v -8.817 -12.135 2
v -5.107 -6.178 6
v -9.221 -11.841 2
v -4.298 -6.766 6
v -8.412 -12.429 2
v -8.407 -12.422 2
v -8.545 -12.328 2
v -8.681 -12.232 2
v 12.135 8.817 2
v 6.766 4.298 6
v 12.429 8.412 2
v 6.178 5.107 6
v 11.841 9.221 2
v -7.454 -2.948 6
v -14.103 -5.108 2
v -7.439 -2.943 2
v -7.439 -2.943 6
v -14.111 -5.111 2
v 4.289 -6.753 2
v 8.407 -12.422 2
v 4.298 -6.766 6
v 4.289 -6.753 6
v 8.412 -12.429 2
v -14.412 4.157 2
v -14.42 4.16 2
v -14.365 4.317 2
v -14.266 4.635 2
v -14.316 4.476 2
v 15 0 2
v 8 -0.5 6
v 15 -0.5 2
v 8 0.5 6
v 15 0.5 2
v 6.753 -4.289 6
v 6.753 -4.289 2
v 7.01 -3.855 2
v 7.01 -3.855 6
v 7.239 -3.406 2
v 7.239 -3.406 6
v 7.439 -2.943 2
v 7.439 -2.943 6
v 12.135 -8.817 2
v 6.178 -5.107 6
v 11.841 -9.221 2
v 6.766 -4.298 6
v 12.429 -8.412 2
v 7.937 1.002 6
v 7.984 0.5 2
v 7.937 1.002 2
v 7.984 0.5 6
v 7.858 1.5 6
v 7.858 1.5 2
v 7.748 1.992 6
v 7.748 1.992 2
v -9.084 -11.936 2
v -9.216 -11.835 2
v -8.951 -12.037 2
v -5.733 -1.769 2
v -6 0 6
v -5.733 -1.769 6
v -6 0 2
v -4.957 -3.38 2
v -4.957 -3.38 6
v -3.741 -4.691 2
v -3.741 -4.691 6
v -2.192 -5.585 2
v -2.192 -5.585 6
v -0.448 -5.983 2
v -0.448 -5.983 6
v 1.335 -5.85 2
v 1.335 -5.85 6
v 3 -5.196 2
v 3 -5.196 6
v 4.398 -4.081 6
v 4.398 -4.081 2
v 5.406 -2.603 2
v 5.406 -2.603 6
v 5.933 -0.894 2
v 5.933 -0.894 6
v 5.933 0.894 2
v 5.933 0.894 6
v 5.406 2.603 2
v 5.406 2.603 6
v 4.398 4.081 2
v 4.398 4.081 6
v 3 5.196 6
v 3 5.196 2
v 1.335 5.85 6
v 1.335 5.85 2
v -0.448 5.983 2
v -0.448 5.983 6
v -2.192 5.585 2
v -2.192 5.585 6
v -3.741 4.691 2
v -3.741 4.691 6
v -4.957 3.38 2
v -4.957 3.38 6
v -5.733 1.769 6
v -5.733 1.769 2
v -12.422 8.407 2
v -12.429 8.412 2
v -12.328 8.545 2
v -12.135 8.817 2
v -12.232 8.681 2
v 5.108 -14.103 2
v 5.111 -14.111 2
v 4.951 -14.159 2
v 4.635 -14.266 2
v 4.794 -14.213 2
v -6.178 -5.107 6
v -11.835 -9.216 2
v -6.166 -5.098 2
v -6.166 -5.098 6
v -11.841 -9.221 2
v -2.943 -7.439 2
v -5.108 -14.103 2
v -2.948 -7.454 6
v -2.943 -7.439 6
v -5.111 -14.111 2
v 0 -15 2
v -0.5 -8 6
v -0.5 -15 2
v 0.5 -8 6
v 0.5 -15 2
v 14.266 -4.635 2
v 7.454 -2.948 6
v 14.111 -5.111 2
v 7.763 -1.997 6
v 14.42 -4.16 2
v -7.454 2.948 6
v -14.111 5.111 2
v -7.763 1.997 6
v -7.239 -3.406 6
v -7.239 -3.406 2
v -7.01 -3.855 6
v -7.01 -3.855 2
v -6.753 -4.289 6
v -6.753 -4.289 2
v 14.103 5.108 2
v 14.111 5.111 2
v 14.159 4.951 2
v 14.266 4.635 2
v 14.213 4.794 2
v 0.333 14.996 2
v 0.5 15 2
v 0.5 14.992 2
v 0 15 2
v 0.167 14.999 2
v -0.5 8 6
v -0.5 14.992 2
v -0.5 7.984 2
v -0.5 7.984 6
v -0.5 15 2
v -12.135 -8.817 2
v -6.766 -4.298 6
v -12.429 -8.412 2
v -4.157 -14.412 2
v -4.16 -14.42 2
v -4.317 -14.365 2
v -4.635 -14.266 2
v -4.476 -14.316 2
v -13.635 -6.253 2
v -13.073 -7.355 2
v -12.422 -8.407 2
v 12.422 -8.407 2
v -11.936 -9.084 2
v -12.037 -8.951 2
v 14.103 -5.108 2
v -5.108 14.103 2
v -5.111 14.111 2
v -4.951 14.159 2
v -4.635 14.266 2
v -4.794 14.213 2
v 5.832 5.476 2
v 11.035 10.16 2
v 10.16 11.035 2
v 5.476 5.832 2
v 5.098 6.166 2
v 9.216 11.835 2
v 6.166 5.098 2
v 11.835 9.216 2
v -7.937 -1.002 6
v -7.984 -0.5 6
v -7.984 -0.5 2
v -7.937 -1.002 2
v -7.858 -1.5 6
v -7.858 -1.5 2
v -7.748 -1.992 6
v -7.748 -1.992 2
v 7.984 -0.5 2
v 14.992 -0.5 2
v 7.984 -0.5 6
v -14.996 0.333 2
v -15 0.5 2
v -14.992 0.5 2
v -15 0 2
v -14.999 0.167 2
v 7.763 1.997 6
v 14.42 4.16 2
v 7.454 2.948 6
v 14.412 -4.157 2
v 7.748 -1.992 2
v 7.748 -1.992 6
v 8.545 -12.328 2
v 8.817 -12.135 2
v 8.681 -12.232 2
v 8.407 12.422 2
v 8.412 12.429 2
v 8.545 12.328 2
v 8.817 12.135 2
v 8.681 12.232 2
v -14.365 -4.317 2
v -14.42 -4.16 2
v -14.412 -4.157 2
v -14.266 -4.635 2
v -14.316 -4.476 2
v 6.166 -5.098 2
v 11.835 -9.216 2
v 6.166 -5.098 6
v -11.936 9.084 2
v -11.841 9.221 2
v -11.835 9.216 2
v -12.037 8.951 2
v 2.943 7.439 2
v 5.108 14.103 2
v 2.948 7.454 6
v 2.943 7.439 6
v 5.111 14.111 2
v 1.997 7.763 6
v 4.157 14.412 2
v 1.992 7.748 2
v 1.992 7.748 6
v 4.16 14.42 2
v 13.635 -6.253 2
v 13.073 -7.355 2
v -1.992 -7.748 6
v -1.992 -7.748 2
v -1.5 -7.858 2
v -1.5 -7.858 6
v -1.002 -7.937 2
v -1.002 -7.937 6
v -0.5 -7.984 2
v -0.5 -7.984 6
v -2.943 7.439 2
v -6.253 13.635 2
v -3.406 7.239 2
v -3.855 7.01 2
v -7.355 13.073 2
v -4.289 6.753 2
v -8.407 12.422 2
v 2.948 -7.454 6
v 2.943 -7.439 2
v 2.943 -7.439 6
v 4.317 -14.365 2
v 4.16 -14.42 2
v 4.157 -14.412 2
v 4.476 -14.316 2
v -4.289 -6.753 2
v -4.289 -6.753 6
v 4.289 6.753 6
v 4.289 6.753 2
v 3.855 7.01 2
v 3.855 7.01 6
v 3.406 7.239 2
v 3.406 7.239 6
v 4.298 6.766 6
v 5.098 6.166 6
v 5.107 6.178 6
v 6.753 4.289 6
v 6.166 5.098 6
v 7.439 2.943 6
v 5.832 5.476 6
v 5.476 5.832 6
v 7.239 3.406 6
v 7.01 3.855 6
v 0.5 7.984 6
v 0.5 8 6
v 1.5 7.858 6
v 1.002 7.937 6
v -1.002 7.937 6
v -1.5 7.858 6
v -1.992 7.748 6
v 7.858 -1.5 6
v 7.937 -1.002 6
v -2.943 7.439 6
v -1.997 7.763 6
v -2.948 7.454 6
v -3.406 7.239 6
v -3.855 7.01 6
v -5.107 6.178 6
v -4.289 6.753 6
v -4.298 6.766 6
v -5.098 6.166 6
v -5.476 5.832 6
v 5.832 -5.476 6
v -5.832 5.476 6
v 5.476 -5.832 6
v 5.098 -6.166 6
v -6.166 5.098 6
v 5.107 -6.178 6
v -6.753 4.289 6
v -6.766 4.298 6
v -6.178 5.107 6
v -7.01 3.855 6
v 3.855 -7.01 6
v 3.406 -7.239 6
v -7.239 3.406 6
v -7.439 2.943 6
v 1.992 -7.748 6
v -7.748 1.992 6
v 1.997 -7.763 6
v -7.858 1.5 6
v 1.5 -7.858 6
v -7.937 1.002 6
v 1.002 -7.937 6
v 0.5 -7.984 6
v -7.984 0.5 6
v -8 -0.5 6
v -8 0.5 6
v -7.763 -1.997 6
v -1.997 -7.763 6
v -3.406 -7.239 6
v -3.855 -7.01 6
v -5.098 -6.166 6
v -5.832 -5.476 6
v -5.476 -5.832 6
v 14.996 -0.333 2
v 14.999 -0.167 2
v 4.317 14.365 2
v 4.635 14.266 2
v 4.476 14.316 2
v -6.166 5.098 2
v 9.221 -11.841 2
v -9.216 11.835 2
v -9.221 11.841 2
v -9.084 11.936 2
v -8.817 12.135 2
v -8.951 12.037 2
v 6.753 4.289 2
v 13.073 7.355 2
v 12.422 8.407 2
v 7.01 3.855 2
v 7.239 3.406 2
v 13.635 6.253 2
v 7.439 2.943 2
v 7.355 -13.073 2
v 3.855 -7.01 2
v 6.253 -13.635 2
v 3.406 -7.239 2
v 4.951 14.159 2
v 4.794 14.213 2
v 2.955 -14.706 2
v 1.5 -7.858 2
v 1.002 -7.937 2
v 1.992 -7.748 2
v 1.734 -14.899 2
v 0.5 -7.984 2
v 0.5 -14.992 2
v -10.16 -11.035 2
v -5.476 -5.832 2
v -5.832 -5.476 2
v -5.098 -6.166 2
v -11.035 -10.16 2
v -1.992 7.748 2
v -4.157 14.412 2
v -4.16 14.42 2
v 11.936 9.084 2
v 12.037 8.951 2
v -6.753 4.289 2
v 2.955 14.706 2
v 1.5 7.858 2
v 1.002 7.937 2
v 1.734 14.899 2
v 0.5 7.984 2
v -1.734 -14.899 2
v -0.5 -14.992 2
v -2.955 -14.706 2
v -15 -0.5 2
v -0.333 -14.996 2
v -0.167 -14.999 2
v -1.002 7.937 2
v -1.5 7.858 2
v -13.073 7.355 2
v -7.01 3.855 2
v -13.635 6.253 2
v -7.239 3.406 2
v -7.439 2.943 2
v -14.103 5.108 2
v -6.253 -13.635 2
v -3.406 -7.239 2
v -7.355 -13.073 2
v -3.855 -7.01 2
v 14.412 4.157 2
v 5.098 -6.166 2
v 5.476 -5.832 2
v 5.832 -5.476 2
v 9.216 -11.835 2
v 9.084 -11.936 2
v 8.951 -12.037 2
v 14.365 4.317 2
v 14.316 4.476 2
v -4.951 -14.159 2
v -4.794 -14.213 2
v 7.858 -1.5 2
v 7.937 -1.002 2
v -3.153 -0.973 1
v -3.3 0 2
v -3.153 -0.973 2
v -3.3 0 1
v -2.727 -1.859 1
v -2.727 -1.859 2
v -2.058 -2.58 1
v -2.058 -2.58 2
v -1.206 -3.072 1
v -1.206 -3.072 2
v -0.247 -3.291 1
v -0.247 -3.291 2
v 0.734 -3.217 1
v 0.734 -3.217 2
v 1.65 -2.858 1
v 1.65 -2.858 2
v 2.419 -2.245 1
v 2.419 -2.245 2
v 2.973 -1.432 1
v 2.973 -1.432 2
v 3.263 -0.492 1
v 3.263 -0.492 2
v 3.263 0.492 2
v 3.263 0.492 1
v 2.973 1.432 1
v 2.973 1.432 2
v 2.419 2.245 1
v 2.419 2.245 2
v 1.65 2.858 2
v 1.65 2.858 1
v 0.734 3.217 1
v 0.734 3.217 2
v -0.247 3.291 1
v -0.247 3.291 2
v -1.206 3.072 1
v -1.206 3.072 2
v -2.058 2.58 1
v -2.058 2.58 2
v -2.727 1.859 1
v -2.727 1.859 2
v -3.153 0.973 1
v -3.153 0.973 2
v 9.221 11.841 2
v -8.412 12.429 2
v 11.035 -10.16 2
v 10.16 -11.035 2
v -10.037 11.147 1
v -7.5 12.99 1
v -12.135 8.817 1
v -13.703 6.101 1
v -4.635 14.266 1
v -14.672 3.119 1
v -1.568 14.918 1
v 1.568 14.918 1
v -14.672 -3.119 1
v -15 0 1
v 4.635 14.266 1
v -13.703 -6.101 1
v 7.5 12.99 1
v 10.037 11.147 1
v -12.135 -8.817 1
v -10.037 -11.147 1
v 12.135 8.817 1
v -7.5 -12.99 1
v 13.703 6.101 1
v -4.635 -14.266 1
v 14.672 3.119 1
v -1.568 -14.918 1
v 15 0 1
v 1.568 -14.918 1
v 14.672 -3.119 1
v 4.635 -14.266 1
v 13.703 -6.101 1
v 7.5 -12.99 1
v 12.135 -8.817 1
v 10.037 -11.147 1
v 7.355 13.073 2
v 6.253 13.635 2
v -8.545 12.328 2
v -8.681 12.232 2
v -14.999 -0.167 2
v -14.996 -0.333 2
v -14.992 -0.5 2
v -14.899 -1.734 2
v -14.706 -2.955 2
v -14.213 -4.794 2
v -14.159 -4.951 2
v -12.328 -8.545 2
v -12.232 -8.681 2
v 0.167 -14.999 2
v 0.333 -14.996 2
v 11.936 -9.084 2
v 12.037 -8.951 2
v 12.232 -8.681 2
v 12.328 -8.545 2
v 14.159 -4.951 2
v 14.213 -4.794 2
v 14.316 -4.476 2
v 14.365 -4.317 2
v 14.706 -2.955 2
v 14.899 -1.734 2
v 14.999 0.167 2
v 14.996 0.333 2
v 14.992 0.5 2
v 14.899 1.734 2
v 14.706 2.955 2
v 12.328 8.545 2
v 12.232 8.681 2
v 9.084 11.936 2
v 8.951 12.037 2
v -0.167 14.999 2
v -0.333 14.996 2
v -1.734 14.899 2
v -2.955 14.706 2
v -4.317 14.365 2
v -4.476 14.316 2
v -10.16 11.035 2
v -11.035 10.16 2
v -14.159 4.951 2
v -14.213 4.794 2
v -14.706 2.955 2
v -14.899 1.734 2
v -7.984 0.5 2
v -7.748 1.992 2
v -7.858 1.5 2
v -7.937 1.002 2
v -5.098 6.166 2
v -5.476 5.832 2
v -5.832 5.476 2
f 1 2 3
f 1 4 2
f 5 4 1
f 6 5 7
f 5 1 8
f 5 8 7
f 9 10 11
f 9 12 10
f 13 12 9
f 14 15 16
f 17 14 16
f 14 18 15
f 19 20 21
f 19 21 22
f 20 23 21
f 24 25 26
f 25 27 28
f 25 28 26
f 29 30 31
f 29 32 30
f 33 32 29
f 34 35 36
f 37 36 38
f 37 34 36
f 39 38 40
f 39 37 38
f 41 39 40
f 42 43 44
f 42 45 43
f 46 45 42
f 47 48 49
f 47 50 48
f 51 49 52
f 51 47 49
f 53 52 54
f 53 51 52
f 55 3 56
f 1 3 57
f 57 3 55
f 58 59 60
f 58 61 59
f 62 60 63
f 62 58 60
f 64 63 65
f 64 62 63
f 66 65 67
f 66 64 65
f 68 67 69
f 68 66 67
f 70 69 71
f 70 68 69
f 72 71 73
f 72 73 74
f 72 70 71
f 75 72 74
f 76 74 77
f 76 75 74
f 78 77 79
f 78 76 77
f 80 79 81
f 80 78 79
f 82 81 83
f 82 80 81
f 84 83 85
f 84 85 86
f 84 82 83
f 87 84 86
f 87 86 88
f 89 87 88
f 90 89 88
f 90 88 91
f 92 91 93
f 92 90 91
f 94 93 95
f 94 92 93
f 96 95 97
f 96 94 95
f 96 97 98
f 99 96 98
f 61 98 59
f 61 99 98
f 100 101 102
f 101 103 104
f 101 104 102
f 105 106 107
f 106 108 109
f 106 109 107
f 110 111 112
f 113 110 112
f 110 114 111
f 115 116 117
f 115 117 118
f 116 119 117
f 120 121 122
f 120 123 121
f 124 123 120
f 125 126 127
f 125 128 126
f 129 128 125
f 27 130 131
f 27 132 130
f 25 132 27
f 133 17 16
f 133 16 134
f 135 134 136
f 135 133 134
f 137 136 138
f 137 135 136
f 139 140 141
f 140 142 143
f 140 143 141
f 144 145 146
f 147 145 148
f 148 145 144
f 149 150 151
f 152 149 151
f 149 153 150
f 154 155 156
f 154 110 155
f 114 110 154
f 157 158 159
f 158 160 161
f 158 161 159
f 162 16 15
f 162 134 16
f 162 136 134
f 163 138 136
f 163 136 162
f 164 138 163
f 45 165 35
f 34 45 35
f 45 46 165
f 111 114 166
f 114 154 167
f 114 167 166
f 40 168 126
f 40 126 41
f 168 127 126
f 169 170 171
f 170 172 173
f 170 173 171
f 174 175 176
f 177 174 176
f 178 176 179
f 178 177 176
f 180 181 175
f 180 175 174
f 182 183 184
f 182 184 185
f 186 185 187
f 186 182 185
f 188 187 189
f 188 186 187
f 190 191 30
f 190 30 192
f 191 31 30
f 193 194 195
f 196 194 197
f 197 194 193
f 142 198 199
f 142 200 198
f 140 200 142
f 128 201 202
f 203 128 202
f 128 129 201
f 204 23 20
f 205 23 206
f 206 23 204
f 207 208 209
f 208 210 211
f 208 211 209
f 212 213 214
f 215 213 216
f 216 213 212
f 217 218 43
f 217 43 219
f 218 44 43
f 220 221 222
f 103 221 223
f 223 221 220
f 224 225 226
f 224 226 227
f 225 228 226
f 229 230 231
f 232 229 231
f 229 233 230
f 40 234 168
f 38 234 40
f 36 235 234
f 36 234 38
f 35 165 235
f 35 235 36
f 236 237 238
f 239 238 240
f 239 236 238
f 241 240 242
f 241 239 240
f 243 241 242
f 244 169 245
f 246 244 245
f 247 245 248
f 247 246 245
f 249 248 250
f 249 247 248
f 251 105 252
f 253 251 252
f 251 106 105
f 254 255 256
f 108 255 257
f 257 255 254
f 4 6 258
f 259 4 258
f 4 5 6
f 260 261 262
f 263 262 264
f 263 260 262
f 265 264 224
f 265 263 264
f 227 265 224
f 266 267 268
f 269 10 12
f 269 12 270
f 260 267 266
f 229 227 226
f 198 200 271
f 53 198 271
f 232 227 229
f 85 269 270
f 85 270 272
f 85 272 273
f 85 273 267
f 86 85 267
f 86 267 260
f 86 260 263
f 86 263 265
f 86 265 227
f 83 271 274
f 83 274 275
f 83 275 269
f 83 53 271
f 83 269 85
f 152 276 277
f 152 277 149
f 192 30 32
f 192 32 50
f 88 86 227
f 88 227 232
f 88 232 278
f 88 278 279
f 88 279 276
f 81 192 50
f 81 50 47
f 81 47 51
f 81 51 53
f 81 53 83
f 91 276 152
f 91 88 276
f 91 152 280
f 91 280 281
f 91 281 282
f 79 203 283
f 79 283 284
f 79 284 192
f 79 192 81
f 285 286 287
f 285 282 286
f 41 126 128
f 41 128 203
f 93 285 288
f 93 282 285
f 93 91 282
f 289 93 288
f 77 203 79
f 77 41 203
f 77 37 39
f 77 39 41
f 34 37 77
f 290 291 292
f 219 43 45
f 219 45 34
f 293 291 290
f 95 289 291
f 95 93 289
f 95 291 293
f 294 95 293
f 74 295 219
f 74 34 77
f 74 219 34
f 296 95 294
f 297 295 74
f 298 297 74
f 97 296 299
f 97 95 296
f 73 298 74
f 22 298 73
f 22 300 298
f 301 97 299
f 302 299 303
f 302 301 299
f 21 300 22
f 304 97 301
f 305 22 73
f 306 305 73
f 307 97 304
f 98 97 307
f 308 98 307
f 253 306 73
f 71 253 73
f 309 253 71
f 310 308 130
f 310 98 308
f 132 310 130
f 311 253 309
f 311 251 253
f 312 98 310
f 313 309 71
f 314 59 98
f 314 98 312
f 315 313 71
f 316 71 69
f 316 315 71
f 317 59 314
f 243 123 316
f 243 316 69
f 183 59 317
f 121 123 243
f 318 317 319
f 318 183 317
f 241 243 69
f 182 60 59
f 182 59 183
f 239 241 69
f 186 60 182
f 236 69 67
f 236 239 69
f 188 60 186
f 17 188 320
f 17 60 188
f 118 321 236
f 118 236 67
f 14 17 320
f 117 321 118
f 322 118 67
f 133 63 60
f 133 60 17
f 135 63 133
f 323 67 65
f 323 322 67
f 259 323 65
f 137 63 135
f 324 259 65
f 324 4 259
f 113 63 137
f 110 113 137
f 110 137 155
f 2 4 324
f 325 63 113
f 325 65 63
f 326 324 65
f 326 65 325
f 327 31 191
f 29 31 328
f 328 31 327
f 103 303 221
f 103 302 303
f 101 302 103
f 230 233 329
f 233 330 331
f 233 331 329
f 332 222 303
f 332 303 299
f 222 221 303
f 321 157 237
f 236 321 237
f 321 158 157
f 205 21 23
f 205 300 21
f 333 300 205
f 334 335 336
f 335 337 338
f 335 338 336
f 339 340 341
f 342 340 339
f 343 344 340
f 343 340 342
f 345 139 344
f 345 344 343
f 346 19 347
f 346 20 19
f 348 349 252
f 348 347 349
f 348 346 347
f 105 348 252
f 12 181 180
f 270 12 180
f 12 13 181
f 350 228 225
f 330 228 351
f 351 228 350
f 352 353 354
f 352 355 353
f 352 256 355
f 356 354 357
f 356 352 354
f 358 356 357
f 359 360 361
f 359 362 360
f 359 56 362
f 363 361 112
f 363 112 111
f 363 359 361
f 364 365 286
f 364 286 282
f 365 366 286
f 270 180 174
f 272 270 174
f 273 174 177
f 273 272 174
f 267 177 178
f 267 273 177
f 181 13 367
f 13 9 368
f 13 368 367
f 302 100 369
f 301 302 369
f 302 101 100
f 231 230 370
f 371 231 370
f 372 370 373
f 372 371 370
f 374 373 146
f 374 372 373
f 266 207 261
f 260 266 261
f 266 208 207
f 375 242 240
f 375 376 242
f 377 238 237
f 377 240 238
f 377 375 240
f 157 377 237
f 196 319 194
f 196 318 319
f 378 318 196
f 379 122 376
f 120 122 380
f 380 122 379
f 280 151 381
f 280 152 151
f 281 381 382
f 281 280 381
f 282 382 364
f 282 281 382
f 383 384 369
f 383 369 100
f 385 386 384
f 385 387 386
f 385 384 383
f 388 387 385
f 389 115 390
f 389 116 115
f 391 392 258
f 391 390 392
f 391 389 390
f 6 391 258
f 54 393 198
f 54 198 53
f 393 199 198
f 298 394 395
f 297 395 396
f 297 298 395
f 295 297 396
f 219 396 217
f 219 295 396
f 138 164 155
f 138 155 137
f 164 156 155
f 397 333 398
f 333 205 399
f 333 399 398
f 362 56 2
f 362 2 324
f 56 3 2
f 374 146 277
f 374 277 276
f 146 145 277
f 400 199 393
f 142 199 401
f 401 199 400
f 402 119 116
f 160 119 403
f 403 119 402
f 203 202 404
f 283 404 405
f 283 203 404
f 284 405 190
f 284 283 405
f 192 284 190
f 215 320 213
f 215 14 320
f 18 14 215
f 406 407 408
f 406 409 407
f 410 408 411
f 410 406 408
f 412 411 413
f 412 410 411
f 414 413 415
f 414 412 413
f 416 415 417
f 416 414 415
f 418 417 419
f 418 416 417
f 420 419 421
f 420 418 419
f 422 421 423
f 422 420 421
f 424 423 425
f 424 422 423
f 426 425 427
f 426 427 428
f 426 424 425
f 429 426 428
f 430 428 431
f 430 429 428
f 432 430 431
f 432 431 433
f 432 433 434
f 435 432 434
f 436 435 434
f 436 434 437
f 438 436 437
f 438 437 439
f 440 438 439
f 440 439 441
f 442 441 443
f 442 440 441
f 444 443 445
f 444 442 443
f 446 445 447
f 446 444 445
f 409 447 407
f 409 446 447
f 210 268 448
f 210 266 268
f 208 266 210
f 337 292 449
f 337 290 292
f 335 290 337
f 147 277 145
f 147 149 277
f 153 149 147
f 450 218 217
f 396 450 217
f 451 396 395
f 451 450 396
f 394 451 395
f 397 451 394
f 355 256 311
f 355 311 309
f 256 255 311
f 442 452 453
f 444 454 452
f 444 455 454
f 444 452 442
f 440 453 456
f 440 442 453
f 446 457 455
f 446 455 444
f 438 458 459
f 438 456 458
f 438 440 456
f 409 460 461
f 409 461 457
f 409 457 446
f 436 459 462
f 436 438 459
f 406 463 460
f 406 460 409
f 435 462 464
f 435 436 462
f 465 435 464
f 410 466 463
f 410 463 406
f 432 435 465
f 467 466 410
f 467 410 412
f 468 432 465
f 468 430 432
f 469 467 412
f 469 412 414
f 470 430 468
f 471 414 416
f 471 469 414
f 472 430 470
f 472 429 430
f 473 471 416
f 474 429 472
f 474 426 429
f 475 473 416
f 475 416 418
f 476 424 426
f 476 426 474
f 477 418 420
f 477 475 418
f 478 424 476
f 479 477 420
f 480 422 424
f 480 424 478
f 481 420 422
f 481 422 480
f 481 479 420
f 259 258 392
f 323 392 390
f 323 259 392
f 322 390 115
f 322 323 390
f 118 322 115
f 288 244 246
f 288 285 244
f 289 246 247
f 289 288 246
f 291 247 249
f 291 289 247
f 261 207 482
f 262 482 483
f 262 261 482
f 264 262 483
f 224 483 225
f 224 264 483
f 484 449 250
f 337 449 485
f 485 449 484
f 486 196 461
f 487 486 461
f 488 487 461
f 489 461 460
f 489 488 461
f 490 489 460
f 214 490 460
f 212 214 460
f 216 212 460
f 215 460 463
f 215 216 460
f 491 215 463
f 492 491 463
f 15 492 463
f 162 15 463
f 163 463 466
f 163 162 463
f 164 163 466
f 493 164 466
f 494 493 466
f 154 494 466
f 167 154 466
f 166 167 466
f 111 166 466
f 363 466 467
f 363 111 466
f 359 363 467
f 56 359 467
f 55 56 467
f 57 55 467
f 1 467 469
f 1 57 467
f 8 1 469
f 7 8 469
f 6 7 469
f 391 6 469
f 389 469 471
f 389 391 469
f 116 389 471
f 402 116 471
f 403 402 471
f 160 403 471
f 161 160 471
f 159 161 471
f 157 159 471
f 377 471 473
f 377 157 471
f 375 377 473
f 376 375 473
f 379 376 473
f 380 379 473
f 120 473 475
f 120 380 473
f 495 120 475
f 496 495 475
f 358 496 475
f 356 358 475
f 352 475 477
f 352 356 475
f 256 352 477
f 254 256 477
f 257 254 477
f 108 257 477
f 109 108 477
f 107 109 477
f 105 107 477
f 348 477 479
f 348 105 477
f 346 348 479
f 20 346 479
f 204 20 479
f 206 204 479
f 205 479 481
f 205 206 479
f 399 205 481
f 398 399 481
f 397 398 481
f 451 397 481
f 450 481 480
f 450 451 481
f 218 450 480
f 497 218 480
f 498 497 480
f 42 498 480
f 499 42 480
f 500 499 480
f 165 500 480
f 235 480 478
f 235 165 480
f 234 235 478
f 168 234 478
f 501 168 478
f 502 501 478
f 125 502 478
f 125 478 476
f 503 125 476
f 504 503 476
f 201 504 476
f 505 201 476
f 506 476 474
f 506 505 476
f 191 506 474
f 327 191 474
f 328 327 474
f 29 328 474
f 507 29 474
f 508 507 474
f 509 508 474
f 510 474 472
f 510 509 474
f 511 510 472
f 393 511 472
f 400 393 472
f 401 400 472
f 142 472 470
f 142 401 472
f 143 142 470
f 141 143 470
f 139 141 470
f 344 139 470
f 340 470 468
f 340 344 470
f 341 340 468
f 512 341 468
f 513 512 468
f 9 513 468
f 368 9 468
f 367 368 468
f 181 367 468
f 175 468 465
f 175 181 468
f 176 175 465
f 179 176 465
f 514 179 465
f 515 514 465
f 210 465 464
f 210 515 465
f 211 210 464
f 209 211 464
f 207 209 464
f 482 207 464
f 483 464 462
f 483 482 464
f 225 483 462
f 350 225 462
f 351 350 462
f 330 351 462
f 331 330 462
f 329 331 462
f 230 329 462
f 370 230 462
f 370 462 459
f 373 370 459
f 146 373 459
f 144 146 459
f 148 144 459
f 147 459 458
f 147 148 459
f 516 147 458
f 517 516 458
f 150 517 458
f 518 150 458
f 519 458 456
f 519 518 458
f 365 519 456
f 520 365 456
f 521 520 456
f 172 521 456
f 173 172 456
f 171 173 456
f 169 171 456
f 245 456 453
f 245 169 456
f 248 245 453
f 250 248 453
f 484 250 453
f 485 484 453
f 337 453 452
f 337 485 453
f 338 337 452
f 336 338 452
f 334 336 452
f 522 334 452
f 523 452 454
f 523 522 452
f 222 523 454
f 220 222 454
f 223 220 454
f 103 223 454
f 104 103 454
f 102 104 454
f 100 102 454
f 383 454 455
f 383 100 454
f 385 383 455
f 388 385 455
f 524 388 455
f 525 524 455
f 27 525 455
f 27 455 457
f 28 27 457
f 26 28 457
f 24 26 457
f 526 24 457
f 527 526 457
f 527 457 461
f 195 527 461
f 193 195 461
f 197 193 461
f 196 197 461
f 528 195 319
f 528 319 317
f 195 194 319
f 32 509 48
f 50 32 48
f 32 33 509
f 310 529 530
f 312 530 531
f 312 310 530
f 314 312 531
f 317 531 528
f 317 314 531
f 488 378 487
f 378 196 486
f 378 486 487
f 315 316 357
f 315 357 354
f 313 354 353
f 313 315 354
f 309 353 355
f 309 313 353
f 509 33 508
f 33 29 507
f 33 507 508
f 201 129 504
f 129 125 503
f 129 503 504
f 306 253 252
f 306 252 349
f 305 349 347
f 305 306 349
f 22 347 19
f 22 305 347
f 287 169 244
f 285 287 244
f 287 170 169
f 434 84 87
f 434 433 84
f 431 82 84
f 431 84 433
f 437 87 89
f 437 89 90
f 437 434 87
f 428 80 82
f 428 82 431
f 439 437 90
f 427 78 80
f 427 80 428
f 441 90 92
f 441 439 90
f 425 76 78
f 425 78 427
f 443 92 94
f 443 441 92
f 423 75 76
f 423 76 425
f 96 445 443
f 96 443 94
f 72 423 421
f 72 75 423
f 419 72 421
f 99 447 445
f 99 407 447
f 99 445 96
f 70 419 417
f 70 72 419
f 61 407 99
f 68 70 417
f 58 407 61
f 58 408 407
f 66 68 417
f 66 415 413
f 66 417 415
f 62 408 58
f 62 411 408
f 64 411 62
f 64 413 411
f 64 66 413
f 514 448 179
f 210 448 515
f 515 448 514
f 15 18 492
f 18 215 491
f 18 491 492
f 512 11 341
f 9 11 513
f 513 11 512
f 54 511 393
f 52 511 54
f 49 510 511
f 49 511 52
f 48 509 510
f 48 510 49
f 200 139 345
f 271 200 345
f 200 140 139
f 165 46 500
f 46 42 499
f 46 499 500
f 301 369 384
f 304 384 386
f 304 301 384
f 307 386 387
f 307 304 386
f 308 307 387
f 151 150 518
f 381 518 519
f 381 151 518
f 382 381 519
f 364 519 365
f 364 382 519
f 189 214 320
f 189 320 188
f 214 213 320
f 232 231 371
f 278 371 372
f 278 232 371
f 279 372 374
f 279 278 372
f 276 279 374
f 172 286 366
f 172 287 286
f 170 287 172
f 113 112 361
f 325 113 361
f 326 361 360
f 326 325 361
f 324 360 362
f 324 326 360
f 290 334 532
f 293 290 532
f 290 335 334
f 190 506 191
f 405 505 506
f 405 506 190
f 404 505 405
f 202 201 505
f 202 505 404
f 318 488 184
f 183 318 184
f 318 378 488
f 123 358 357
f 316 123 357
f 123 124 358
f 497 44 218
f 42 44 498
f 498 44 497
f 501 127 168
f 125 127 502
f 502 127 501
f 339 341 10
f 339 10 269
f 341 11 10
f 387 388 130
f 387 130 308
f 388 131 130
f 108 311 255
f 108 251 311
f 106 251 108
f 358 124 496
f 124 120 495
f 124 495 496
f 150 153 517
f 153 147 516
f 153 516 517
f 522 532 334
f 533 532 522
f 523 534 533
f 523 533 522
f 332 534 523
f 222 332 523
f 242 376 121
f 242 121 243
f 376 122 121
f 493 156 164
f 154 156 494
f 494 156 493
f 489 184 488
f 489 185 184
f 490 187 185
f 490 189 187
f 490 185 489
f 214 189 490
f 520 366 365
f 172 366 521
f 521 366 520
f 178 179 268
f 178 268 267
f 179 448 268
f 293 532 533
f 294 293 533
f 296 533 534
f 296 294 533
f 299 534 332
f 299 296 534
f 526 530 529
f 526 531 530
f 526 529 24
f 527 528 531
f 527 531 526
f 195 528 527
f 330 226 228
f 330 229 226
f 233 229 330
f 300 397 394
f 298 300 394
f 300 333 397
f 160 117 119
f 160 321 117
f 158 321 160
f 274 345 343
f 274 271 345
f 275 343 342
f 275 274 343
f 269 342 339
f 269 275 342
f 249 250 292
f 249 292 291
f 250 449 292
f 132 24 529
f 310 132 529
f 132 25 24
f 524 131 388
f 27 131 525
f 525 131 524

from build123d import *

# Parameters (mm, degrees)
EXTRUDE016_DEPTH = 0.5
ARRAY_COUNT      = 20


with BuildPart() as revolve003:
    # Sketch022 → Revolve003 (revolve)
    with BuildSketch(Plane.XZ):
        Polygon((-3.3, 1), (-15, 1), (-15, 2), (-8, 2), (-8, 6), (-6, 6), (-6, 2), (-3.3, 2), align=None)
    revolve(axis=Axis((0, 0, 0), (0, 0, 1)))


with BuildPart() as barrel003:
    # Sketch023 → Extrude016 (new body, symmetric)
    with BuildSketch(Plane.XZ):
        Polygon((-8, 6), (-15, 2), (-7, 2), (-7, 6), align=None)
    extrude(amount=EXTRUDE016_DEPTH, both=True)

    # Array: barrel003 ×20 about axis
    array_axis = Axis((0, 0, 0), (0, 0, 1))


with BuildPart() as barrel003_1:
    add(barrel003.part)
    for i in range(1, ARRAY_COUNT):
        add(barrel003.part.rotate(array_axis, i * 360 / ARRAY_COUNT))

    # Fusion005: union Revolve003
    add(revolve003.part)


solid = barrel003_1.part
